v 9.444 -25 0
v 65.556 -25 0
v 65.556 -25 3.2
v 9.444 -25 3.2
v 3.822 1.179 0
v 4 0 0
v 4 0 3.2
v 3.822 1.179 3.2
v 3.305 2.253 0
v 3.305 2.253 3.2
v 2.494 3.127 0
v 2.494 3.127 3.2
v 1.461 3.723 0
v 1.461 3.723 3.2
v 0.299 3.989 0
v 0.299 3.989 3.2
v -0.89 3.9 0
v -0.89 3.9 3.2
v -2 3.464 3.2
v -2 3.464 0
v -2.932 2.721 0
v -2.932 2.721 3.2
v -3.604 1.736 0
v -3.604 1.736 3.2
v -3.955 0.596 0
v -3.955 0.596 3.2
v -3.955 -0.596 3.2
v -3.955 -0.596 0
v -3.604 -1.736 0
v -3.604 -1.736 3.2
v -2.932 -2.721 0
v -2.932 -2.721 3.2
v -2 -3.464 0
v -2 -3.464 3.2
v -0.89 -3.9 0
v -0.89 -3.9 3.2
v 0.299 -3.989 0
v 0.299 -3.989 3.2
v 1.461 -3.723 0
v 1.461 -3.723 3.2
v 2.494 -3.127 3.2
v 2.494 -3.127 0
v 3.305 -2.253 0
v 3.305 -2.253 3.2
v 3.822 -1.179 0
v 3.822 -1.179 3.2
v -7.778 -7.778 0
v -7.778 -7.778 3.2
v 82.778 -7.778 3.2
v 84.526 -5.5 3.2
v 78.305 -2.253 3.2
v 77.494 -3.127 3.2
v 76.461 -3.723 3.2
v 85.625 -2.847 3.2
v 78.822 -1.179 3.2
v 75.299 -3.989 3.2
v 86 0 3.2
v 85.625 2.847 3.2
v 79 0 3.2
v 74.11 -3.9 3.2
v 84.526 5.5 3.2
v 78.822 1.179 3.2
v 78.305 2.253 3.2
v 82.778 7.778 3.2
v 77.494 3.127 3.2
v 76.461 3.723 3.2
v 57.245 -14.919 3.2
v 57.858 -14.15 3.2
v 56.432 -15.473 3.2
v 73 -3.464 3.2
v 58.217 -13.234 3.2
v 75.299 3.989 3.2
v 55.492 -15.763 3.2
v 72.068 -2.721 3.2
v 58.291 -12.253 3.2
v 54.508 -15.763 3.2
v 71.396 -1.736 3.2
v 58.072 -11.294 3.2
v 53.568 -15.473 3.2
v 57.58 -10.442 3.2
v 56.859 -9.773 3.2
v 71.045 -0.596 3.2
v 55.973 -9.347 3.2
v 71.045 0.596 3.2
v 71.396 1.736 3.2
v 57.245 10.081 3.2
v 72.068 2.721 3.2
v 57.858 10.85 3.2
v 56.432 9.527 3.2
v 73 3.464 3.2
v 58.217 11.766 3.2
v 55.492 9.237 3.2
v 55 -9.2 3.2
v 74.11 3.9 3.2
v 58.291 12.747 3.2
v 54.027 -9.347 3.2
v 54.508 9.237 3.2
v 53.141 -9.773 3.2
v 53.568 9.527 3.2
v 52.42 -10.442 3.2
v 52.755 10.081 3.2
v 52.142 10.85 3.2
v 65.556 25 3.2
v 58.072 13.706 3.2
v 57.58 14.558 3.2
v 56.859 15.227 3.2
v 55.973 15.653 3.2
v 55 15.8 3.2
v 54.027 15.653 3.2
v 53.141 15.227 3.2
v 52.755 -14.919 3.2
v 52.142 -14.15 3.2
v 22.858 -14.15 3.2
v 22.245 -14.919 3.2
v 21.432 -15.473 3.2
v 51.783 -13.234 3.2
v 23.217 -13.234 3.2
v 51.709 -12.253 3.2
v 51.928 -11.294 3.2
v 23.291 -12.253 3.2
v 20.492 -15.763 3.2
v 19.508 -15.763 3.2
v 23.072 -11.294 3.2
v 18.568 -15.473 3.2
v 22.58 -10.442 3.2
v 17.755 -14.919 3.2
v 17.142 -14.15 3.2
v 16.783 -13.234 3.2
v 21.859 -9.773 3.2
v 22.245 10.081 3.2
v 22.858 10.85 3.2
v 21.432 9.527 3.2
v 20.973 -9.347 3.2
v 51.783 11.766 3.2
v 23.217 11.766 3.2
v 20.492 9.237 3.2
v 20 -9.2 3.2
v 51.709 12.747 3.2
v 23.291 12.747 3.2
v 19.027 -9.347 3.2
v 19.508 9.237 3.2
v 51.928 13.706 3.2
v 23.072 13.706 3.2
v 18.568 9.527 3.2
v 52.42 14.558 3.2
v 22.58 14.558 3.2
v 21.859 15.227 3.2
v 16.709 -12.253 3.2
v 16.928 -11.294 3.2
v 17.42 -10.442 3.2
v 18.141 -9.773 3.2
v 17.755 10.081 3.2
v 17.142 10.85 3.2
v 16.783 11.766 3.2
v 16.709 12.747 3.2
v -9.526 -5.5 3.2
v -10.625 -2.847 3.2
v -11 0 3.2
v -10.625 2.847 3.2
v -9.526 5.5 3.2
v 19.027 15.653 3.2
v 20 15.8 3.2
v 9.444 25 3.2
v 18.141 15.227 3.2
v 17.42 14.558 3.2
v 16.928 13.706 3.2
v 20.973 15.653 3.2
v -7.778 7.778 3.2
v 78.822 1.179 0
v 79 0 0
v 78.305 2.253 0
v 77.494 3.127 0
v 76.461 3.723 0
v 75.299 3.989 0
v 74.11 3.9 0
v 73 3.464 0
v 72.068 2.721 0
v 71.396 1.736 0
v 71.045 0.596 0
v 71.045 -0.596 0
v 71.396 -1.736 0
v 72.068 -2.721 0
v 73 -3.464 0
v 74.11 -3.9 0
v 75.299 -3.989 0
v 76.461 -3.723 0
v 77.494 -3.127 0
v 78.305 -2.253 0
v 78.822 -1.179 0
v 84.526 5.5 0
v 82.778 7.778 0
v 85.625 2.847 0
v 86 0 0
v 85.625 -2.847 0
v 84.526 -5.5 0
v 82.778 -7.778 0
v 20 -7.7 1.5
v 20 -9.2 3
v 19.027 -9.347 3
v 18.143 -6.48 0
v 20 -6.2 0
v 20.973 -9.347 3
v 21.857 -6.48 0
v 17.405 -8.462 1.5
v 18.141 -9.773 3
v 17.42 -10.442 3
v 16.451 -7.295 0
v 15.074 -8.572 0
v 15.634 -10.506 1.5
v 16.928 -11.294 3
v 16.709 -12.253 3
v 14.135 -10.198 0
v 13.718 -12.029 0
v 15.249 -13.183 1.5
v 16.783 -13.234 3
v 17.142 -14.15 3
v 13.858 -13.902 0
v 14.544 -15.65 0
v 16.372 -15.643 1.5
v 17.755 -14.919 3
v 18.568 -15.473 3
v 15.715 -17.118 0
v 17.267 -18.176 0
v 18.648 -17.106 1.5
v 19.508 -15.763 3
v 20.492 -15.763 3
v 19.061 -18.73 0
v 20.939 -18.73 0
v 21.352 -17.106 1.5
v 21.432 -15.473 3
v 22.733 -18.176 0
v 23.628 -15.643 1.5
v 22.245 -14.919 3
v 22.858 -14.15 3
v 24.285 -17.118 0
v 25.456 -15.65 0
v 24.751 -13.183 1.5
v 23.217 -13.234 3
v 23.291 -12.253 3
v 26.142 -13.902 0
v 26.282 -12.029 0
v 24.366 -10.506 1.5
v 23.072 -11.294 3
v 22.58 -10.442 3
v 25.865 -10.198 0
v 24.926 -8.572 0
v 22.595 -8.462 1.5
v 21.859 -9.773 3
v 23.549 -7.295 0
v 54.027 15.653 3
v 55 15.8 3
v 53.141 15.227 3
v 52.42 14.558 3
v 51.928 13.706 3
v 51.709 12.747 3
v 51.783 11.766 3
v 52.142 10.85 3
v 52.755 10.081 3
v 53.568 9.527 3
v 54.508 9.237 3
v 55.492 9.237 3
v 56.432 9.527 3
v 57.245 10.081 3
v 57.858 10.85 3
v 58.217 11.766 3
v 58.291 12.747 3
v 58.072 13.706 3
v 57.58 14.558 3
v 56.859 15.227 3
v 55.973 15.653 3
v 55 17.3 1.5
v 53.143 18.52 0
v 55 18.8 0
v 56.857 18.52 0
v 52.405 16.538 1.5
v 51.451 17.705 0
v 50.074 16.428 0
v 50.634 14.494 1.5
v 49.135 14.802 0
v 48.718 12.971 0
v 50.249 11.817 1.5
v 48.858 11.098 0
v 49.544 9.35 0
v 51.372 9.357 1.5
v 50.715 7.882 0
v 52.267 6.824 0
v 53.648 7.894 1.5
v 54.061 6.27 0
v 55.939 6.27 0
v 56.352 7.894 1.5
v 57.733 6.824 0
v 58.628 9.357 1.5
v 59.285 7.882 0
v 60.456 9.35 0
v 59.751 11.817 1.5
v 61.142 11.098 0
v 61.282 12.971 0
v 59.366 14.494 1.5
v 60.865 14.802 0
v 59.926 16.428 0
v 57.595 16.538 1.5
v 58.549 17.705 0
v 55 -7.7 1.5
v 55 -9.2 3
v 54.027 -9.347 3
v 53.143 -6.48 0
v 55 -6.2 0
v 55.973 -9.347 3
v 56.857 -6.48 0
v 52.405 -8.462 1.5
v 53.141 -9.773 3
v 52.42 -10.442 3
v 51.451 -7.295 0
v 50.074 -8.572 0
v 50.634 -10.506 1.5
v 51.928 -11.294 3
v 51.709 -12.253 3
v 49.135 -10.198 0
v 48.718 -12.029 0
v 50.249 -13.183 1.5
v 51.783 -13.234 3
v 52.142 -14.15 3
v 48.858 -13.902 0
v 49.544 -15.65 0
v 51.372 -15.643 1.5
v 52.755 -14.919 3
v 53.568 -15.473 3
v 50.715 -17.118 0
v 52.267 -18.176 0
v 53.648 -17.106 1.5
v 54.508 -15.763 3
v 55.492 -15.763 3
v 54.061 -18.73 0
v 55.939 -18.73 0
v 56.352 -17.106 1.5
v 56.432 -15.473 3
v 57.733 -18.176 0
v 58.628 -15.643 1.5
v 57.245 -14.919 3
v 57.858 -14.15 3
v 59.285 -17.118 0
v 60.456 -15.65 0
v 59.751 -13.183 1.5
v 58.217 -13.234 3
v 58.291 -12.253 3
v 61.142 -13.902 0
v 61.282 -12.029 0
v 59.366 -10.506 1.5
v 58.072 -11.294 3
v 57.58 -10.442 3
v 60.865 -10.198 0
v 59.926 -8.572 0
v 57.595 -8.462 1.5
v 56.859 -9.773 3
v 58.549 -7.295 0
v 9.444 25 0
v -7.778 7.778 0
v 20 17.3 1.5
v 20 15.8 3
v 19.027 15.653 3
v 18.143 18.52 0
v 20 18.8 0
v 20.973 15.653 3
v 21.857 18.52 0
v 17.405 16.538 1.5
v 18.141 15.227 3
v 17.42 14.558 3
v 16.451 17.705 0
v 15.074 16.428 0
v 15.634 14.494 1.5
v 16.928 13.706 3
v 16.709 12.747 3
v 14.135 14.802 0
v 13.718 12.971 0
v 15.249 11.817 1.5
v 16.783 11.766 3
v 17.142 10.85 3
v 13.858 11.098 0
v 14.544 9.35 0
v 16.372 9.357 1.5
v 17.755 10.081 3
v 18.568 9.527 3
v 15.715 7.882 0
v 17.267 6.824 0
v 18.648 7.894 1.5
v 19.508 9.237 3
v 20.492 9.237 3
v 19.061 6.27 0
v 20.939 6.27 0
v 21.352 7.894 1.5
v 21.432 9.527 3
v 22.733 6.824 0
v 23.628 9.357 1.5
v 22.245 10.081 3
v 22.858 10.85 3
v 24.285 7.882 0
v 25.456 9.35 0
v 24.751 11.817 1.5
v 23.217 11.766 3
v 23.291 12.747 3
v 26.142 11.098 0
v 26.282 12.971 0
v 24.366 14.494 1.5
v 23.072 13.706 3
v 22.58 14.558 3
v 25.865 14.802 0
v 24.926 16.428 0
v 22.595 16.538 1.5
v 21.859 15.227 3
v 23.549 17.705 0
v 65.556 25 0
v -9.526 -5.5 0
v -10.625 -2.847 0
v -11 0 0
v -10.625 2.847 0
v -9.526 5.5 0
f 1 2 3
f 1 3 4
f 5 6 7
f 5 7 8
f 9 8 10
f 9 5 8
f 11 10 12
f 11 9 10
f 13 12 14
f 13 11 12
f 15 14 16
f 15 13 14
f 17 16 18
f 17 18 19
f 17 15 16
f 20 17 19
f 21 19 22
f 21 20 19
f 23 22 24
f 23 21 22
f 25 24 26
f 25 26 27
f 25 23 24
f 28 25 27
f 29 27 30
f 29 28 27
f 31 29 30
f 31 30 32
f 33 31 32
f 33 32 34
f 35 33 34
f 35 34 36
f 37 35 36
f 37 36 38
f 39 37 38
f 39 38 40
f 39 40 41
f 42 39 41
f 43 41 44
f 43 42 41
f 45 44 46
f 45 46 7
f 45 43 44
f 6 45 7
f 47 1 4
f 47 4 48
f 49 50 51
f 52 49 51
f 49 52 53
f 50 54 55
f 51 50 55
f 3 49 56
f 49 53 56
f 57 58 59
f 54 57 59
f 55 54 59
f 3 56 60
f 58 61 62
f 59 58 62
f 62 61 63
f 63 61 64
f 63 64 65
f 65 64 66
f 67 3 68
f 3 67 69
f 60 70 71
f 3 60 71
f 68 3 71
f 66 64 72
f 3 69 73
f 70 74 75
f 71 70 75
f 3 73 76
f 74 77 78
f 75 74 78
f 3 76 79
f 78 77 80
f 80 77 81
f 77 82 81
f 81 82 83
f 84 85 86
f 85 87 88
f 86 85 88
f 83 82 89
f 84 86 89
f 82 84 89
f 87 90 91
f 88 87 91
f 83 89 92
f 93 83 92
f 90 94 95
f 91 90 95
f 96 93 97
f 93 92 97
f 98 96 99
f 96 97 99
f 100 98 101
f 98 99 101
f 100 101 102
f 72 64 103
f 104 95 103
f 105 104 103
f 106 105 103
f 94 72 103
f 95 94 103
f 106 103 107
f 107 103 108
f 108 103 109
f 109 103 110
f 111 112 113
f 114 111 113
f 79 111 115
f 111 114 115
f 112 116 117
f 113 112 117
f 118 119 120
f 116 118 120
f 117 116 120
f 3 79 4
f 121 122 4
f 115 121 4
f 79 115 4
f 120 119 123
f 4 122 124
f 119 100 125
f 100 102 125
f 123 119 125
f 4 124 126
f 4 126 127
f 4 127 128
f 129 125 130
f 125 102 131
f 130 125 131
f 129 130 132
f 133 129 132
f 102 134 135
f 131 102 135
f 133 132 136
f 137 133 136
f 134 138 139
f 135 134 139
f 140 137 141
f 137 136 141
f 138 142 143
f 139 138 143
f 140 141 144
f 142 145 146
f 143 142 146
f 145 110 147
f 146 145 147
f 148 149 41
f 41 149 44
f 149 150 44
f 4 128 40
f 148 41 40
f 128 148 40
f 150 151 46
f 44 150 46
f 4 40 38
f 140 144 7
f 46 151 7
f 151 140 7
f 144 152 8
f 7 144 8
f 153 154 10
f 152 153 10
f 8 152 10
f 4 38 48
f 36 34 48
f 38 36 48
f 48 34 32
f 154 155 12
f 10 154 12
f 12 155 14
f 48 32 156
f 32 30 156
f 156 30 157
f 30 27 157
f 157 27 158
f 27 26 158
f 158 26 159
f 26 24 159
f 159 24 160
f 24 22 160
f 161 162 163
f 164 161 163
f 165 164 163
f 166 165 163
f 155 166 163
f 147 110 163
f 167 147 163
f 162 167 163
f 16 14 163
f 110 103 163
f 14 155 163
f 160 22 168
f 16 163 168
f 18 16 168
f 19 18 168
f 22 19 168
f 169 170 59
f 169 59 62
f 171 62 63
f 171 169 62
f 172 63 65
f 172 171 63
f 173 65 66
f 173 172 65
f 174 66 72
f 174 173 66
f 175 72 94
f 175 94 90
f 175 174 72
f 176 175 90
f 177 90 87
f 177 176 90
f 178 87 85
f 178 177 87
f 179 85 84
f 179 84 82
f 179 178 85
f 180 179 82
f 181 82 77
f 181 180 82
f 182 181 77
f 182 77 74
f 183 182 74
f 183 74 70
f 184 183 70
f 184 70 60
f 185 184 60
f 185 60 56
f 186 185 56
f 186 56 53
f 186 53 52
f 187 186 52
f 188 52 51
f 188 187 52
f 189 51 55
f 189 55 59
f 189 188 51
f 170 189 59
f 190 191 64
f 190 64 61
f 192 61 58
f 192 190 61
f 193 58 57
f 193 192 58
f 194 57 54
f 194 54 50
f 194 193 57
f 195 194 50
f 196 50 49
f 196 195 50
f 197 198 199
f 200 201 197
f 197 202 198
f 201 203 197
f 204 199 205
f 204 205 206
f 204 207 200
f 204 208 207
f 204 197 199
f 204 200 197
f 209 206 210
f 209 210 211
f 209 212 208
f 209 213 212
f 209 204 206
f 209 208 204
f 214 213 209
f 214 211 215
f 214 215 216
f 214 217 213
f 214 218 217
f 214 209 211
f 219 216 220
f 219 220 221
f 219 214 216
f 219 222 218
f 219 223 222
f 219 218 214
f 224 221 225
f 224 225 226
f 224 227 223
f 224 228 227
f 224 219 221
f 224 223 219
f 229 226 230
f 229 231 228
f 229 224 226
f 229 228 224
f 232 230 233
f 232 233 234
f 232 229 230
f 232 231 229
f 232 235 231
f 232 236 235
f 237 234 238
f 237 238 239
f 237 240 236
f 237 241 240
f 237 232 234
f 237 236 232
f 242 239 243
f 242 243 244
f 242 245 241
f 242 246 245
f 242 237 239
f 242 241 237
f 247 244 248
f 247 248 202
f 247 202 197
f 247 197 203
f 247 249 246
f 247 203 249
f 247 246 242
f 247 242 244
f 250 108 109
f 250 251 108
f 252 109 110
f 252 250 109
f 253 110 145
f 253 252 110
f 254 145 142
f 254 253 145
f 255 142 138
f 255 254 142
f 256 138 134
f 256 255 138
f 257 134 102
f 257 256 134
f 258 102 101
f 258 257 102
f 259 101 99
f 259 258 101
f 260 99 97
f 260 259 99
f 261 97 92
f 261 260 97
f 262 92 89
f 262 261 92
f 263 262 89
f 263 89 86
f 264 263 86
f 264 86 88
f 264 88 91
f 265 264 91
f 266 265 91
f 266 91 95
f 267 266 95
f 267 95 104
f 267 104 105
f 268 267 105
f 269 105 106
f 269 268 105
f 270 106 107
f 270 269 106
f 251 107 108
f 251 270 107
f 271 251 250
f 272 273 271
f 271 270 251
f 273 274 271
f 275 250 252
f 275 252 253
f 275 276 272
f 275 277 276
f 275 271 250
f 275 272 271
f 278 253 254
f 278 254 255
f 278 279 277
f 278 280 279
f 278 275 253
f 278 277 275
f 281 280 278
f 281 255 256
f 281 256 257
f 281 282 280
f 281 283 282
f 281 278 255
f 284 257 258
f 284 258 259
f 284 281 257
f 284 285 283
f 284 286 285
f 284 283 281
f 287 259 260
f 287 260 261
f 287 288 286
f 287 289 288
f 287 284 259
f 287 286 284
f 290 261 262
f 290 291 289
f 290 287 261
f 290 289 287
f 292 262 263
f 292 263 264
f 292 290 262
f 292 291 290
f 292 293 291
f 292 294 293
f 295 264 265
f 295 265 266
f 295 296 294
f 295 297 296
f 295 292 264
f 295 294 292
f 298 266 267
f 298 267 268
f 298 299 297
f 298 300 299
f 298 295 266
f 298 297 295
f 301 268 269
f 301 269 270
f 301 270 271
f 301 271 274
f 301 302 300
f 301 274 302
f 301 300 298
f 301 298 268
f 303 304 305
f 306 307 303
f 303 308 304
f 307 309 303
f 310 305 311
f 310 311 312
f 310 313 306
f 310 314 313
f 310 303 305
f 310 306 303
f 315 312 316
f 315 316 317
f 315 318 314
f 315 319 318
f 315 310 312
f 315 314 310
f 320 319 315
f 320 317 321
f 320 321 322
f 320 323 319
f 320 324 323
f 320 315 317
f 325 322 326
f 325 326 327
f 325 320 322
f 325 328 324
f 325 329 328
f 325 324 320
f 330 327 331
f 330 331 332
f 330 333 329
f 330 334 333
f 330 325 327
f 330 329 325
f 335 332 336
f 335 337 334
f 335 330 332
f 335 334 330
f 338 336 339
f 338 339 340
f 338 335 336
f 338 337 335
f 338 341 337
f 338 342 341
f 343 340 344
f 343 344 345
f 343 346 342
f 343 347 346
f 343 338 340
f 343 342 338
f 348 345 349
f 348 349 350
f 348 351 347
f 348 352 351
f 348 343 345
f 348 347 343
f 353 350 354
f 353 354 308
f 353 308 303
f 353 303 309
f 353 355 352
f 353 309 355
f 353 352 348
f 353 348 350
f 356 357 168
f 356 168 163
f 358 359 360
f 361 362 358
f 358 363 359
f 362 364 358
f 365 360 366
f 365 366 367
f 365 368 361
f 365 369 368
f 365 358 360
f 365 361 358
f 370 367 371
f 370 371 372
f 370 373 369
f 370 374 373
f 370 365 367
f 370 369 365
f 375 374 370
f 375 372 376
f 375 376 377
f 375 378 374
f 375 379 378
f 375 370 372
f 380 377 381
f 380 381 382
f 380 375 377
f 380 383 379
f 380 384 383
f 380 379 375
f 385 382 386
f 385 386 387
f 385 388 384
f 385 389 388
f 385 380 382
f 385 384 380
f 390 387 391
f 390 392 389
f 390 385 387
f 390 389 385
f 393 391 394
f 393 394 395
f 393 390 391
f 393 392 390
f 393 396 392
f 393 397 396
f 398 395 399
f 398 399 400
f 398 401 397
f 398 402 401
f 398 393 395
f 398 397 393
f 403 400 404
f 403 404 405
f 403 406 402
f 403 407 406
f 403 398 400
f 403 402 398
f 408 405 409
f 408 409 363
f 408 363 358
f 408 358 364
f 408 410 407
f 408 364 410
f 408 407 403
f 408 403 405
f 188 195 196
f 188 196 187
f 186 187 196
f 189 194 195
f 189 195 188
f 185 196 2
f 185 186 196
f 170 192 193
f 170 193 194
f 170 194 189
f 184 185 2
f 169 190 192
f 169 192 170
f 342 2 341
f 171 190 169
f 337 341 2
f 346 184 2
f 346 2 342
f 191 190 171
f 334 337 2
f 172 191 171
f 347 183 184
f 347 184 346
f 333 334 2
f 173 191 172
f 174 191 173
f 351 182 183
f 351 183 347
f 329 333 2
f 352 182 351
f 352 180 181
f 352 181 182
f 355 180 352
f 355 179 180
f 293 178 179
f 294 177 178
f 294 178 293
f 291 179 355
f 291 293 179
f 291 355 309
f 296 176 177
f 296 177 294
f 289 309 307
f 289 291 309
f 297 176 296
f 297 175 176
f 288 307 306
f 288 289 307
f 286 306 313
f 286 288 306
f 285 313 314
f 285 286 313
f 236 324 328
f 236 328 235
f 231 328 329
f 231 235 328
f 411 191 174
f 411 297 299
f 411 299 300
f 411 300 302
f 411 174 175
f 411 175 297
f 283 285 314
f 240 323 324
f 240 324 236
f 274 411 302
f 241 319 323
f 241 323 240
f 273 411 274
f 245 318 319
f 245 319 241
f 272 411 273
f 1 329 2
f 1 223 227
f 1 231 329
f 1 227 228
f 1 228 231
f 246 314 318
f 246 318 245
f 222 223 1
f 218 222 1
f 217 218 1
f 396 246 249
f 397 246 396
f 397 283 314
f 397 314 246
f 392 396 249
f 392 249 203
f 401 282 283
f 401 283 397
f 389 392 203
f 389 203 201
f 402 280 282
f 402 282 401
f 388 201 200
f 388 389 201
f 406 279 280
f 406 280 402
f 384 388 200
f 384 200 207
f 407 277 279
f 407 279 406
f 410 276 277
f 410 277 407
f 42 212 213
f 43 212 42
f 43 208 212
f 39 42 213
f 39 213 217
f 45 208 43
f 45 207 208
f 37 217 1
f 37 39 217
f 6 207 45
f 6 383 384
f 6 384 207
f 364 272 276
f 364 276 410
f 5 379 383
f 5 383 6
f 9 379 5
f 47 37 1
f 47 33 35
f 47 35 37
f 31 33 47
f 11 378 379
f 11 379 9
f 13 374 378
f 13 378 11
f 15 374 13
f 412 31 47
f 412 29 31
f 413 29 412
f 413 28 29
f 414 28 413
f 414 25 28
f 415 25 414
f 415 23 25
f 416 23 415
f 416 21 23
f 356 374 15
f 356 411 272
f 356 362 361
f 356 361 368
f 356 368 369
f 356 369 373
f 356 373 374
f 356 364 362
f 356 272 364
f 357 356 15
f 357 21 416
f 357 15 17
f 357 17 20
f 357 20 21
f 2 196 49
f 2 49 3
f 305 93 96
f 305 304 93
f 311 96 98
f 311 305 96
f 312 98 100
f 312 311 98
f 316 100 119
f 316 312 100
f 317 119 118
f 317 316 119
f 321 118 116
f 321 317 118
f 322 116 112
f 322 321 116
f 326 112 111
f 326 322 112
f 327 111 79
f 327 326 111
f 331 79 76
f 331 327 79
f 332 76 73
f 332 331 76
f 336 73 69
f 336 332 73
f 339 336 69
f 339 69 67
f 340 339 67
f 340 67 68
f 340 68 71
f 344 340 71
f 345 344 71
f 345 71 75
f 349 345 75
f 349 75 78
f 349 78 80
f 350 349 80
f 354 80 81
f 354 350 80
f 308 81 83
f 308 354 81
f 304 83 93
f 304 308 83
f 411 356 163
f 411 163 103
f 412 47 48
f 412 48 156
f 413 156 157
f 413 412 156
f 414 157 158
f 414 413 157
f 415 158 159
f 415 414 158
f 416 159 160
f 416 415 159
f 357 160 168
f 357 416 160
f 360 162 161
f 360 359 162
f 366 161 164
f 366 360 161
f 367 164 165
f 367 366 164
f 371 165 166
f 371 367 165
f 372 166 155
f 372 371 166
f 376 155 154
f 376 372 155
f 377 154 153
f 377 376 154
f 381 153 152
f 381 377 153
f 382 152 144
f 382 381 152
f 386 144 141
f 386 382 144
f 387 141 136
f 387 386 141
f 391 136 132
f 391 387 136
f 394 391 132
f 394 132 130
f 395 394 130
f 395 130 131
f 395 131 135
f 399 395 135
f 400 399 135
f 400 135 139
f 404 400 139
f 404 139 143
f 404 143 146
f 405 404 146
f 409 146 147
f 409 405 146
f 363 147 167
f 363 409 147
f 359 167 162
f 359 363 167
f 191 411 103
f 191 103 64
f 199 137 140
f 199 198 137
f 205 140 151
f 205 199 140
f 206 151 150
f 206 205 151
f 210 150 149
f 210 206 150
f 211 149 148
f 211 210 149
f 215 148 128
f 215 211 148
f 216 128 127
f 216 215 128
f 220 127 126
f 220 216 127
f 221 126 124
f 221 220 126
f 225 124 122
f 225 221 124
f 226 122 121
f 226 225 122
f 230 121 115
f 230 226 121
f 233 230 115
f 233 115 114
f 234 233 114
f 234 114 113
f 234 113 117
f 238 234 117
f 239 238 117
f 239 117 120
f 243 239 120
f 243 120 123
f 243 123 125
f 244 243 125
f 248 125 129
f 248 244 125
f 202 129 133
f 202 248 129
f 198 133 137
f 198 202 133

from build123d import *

# Parameters (mm, degrees)
SKETCH1_R                                      = 4
BOSS_EXTRUDE1_DEPTH                            = 3.2
CSK_FOR_M6_FLAT_HEAD_MACHINE_SCREW1_AT_2_COUNT = 2
CSK_FOR_M6_FLAT_HEAD_MACHINE_SCREW1_AT_2_PITCH = 25
CSK_FOR_M6_FLAT_HEAD_MACHINE_SCREW1_AT_3_COUNT = 2
CSK_FOR_M6_FLAT_HEAD_MACHINE_SCREW1_AT_3_PITCH = 43.011626335
CSK_FOR_M6_FLAT_HEAD_MACHINE_SCREW1_AT_4_COUNT = 2
CSK_FOR_M6_FLAT_HEAD_MACHINE_SCREW1_AT_4_PITCH = 35


with BuildPart() as part:
    # Sketch1 → Boss-Extrude1 (new body)
    with BuildSketch(Plane.XY):
        with BuildLine():
            Line((9.443650814, 25), (65.556349186, 25))
            Line((65.556349186, 25), (82.778174593, 7.778174593))
            ThreePointArc((82.778174593, 7.778174593), (86, 0), (82.778174593, -7.778174593))
            Line((82.778174593, -7.778174593), (65.556349186, -25))
            Line((65.556349186, -25), (9.443650814, -25))
            Line((9.443650814, -25), (-7.778174593, -7.778174593))
            ThreePointArc((-7.778174593, -7.778174593), (-11, 0), (-7.778174593, 7.778174593))
            Line((-7.778174593, 7.778174593), (9.443650814, 25))
        make_face()
        Circle(SKETCH1_R, mode=Mode.SUBTRACT)
        with Locations((75, 0)):
            Circle(SKETCH1_R, mode=Mode.SUBTRACT)
    extrude(amount=BOSS_EXTRUDE1_DEPTH)

    # Sketch13 → CSK for M6 Flat Head Machine Screw1 (revolve, cut)
    with BuildSketch(Plane(origin=(20, -12.5, 0), x_dir=(0, 1, 0), z_dir=(1, 0, 0))):
        Polygon((0, 0), (0, 3.2), (3.3, 3.2), (3.3, 3), (6.3, 0), align=None)
    csk_for_m6_flat_head_machine_screw1 = revolve(axis=Axis((20, -12.5, -6.35), (0, 0, 1)), mode=Mode.SUBTRACT)

    # CSK for M6 Flat Head Machine Screw1 at 2: CSK for M6 Flat Head Machine Screw1 ×2
    with Locations(*[(0, i * CSK_FOR_M6_FLAT_HEAD_MACHINE_SCREW1_AT_2_PITCH, 0) for i in range(1, CSK_FOR_M6_FLAT_HEAD_MACHINE_SCREW1_AT_2_COUNT)]):
        add(csk_for_m6_flat_head_machine_screw1, mode=Mode.SUBTRACT)

    # CSK for M6 Flat Head Machine Screw1 at 3: CSK for M6 Flat Head Machine Screw1 ×2
    with Locations(*[Vector(0.813733471, 0.581238194, 0) * (i * CSK_FOR_M6_FLAT_HEAD_MACHINE_SCREW1_AT_3_PITCH) for i in range(1, CSK_FOR_M6_FLAT_HEAD_MACHINE_SCREW1_AT_3_COUNT)]):
        add(csk_for_m6_flat_head_machine_screw1, mode=Mode.SUBTRACT)

    # CSK for M6 Flat Head Machine Screw1 at 4: CSK for M6 Flat Head Machine Screw1 ×2
    with Locations(*[(i * CSK_FOR_M6_FLAT_HEAD_MACHINE_SCREW1_AT_4_PITCH, 0, 0) for i in range(1, CSK_FOR_M6_FLAT_HEAD_MACHINE_SCREW1_AT_4_COUNT)]):
        add(csk_for_m6_flat_head_machine_screw1, mode=Mode.SUBTRACT)


solid = part.part
